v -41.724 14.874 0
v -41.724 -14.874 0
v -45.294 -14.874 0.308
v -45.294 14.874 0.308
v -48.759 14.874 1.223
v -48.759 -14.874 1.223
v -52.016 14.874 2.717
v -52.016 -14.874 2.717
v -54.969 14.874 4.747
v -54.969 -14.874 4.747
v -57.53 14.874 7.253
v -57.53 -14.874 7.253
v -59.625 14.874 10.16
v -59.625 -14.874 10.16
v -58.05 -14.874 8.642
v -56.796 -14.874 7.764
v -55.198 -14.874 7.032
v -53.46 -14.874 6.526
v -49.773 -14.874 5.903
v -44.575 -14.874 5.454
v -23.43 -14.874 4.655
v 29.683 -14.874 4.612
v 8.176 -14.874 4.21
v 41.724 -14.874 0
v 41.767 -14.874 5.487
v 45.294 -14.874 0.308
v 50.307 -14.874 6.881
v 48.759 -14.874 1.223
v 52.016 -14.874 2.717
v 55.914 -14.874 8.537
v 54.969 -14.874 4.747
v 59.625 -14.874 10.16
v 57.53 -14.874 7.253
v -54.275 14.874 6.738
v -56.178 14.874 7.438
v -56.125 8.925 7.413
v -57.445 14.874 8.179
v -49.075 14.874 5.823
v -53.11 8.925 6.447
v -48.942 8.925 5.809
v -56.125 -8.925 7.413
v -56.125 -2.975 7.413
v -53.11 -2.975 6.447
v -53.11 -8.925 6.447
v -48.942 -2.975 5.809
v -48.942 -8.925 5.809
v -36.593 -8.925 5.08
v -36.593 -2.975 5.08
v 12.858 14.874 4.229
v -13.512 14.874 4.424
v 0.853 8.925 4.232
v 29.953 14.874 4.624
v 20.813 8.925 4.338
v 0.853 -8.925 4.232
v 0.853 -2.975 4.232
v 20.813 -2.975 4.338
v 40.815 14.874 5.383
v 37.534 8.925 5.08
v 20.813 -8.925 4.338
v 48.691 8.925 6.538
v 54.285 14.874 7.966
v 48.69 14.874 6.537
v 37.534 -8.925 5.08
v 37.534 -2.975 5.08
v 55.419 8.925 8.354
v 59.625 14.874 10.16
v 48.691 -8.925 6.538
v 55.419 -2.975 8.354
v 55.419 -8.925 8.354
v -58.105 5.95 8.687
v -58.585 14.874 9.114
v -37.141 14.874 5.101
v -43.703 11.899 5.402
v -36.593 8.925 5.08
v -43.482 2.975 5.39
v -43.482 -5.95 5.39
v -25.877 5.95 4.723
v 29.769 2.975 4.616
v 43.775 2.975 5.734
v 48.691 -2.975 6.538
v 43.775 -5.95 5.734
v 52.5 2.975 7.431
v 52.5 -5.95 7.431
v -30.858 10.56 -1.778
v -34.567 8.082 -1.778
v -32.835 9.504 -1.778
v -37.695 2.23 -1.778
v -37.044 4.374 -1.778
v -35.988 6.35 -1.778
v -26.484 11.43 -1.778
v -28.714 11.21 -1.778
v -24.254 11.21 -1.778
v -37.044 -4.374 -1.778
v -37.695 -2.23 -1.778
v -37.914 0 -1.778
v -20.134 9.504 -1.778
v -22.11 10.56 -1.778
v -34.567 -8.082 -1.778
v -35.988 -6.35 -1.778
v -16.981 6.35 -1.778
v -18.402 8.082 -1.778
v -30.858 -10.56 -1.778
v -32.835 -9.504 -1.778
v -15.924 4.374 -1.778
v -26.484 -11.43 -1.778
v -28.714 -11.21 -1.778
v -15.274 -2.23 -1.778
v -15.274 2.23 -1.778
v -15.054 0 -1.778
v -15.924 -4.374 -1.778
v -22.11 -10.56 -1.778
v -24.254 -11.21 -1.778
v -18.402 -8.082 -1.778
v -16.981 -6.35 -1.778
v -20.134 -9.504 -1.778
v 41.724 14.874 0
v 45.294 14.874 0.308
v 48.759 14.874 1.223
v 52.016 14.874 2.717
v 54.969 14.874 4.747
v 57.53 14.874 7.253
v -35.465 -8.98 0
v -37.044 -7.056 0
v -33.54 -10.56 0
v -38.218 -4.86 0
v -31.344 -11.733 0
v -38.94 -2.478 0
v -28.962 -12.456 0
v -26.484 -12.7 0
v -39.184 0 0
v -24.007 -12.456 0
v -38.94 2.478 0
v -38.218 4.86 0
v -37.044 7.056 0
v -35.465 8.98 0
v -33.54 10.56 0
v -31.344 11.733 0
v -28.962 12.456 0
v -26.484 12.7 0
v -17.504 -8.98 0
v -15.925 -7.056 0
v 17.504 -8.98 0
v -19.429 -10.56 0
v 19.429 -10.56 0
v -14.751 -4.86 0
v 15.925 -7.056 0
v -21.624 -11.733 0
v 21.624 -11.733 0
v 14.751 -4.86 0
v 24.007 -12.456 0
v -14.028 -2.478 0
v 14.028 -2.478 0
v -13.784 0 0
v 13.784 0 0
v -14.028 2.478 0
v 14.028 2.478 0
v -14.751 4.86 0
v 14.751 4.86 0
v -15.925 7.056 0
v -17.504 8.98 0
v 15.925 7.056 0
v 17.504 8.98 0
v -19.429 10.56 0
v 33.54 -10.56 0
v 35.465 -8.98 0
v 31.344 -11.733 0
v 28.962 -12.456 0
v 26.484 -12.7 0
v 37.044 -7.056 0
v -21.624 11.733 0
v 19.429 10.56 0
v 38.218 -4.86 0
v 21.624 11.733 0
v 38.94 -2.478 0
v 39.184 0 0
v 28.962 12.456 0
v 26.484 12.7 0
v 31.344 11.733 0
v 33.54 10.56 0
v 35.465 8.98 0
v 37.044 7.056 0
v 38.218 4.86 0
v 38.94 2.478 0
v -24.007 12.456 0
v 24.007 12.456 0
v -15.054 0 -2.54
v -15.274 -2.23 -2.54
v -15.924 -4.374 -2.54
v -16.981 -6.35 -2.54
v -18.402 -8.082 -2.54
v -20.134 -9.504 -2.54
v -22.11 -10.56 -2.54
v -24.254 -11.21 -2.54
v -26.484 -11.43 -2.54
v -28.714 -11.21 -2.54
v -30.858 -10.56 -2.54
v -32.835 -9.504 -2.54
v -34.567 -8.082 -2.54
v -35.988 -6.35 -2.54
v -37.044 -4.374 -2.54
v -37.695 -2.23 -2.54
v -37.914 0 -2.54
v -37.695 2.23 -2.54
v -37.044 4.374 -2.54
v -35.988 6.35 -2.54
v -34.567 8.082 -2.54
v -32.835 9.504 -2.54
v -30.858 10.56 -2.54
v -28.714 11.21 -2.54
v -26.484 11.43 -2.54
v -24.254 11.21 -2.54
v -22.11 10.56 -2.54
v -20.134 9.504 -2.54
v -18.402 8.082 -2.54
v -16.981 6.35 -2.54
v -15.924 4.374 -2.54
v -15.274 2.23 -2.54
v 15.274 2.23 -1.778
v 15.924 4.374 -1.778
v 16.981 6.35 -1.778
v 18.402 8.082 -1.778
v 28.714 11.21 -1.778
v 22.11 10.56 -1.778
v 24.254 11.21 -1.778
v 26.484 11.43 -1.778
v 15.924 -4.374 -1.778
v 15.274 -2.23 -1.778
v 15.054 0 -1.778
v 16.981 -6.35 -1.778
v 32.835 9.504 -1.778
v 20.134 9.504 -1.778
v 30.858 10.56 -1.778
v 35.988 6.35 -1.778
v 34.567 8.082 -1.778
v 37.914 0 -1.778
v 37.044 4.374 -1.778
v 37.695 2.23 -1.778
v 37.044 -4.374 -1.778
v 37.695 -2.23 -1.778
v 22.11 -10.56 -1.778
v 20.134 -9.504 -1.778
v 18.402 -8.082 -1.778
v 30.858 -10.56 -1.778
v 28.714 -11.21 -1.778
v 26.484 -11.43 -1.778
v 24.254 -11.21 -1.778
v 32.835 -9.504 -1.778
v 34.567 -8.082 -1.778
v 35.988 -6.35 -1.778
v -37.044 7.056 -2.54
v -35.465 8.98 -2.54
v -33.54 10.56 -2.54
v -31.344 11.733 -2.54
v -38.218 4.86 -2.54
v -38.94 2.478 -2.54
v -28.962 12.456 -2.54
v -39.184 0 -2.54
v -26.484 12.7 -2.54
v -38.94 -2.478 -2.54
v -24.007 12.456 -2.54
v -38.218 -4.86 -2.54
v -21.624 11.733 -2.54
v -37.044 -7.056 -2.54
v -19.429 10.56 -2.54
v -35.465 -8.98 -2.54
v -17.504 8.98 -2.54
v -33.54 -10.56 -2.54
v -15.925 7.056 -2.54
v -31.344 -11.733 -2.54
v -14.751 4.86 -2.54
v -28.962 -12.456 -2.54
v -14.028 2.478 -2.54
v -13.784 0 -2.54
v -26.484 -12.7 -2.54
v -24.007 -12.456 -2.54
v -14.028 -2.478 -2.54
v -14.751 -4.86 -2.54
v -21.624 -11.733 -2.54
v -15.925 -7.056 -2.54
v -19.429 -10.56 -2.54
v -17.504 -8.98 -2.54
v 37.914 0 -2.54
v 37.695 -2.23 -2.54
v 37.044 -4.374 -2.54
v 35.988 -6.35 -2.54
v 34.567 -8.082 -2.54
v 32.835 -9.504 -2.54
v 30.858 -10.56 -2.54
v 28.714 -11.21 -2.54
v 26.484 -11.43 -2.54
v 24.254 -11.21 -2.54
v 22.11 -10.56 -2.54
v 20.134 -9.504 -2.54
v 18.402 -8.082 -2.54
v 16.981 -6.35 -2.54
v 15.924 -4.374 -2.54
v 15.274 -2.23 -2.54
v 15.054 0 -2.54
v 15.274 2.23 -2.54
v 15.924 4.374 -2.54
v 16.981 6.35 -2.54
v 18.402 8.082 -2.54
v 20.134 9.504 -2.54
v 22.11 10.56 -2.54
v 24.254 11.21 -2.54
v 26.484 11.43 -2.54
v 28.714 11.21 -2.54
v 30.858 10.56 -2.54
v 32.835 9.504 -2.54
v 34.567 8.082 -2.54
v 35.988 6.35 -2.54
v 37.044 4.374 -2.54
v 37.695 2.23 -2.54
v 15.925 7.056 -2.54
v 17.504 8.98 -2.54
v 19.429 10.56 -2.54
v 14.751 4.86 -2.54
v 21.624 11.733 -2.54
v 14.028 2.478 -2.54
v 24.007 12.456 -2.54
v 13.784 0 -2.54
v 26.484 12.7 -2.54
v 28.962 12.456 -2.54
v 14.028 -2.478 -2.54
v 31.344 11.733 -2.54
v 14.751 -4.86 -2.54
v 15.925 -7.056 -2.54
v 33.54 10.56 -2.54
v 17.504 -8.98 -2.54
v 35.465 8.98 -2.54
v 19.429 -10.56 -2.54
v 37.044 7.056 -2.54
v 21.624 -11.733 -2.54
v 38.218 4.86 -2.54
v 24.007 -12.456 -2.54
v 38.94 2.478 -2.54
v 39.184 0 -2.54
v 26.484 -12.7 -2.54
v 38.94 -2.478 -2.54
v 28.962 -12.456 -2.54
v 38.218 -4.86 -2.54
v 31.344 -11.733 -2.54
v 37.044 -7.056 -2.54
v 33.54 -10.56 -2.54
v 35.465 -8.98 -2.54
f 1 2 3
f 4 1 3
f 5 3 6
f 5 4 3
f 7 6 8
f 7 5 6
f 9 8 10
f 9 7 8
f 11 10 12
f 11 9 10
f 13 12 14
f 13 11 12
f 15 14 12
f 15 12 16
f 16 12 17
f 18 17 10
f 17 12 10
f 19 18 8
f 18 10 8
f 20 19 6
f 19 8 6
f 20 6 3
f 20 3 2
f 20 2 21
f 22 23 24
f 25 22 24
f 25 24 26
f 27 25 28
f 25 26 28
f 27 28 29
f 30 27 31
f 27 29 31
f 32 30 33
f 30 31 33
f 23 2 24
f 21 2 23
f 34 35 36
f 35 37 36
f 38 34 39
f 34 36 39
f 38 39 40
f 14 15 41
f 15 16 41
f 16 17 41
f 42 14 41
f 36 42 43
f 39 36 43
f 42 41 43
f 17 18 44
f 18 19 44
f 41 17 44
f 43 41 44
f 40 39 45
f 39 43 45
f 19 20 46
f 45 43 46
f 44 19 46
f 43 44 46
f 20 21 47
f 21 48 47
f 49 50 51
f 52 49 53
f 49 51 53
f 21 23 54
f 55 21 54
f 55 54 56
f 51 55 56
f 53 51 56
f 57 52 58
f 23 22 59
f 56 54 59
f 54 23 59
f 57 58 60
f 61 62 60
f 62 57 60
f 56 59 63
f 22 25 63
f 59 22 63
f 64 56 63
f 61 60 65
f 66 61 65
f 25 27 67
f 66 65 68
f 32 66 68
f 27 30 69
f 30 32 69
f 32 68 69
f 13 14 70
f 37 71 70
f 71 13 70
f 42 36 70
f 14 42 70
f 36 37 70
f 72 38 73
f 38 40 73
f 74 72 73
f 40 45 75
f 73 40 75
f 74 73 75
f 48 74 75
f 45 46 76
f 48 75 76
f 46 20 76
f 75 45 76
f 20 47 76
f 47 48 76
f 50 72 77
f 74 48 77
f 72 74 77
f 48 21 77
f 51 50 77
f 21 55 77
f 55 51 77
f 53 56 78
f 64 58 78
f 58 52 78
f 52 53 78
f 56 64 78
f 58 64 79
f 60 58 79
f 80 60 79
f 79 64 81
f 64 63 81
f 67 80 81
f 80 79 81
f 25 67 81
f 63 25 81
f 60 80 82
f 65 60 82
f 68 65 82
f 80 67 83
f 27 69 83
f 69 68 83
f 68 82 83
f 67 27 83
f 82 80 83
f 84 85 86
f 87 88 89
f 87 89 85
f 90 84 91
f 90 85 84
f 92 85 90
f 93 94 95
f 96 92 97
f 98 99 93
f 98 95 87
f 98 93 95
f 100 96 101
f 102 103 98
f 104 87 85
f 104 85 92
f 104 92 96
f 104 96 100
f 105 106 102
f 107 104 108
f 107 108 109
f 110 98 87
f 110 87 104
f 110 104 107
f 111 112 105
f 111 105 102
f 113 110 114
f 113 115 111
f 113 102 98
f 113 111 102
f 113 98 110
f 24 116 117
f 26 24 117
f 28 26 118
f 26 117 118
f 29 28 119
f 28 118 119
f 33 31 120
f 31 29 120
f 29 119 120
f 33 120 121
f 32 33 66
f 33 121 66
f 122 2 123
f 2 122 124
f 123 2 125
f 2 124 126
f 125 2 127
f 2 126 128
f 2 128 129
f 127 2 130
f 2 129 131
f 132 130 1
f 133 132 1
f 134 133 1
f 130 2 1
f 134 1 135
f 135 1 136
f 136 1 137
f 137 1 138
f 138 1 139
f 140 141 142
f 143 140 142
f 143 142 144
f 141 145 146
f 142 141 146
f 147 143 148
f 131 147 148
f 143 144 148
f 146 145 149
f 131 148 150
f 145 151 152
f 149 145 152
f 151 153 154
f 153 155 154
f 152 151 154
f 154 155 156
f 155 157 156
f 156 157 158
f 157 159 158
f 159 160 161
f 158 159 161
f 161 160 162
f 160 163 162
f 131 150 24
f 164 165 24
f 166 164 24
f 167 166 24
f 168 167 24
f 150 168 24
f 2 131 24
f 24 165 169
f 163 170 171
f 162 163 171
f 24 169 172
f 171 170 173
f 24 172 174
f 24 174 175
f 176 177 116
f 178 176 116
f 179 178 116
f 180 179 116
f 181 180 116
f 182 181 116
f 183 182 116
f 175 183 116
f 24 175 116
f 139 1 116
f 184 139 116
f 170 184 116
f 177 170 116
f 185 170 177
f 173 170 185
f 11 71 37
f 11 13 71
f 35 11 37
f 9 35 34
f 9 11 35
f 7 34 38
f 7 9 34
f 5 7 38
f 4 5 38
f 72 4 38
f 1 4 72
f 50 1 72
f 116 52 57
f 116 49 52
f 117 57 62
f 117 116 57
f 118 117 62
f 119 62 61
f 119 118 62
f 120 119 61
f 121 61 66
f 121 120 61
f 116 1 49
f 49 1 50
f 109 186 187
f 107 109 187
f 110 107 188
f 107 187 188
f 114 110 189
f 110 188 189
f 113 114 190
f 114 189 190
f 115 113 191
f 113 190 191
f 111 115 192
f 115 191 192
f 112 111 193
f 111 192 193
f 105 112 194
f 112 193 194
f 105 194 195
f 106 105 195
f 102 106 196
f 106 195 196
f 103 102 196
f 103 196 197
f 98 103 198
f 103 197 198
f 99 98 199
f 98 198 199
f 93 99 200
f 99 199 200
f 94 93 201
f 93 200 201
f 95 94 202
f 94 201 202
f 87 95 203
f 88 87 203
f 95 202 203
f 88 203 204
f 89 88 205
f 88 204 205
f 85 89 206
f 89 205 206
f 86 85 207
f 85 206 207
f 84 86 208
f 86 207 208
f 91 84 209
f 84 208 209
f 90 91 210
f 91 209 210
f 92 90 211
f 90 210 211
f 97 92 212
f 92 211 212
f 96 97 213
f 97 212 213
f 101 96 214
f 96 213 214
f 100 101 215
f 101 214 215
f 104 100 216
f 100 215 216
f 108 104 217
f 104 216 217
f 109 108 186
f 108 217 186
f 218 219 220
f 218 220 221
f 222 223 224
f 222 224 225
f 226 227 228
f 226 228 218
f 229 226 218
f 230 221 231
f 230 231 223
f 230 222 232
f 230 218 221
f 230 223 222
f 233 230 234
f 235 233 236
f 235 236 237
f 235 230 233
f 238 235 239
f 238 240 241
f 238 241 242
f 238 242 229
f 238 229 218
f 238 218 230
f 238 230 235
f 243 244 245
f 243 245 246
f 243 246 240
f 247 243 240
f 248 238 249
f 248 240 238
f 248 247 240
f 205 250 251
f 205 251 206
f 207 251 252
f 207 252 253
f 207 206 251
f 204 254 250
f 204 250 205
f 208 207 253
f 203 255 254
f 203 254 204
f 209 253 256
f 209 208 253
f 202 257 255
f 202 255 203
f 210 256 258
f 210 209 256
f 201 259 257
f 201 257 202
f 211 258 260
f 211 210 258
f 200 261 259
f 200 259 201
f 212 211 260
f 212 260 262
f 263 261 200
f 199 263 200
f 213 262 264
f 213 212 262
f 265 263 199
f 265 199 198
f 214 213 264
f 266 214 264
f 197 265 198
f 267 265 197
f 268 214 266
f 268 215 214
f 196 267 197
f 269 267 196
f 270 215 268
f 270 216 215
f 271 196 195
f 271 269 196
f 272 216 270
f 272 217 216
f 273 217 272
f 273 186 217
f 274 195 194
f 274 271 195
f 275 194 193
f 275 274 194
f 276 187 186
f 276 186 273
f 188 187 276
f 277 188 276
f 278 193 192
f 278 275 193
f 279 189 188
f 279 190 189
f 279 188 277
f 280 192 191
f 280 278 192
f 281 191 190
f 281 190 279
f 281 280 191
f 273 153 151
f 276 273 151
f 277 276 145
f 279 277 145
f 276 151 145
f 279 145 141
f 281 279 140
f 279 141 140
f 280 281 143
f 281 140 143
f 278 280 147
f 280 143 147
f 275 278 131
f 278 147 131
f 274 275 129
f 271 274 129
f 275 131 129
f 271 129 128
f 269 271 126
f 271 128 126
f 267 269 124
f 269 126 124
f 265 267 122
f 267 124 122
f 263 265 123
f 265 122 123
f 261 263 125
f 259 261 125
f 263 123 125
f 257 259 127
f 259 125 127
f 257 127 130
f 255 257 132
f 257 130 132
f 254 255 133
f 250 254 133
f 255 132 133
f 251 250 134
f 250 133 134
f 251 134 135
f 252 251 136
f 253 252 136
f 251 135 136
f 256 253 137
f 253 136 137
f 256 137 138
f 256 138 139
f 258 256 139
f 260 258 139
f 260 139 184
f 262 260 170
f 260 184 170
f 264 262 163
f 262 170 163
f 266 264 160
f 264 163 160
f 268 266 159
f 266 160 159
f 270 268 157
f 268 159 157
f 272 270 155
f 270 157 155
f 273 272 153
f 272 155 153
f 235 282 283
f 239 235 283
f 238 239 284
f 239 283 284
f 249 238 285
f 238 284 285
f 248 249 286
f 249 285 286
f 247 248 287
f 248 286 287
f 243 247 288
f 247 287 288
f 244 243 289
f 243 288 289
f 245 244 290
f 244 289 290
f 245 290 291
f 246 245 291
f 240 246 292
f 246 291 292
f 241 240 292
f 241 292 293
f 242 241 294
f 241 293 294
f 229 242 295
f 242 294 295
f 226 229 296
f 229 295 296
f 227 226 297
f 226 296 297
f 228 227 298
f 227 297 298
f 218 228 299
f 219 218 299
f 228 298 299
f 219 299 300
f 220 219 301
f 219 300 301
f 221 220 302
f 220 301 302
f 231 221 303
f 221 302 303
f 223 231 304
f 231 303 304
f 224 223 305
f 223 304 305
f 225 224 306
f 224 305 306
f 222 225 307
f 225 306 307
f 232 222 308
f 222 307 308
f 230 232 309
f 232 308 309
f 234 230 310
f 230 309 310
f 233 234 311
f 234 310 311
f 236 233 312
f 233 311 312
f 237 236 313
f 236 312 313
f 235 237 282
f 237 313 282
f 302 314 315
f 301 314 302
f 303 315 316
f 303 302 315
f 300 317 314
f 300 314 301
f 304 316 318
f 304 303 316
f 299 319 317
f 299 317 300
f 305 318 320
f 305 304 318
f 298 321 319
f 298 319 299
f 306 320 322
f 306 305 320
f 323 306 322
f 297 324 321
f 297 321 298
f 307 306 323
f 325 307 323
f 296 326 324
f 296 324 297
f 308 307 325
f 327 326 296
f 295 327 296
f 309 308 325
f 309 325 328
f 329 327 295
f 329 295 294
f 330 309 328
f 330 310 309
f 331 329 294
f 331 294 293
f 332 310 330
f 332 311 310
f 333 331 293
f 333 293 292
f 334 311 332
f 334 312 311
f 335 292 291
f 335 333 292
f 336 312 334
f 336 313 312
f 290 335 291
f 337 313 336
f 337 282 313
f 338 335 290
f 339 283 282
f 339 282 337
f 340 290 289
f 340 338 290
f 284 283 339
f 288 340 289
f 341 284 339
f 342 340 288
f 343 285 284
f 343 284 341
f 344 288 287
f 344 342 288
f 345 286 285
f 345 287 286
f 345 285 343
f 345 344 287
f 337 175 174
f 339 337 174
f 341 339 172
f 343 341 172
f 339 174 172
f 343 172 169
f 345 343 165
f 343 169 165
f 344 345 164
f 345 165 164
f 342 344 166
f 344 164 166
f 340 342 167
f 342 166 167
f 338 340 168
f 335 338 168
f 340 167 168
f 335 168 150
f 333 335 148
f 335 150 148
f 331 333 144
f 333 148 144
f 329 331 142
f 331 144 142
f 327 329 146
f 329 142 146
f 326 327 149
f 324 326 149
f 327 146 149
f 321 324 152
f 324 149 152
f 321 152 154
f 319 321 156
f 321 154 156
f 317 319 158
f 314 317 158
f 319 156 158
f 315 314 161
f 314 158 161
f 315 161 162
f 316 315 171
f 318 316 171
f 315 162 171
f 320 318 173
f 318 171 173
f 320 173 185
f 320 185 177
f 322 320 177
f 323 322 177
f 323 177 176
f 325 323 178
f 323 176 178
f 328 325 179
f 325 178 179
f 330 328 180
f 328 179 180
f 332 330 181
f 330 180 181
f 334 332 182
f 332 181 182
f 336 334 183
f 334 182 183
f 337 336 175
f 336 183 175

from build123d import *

# Parameters (mm, degrees)
F0_W        = 119.2497462034
F0_H        = 29.7487415373
F1_DEPTH    = 10.16
F3_DEPTH    = 35.052
F4_T1_DEPTH = 119.2514082514
F5_R        = 12.7
F6_DEPTH    = 2.54
F7_R        = 11.43
F8_DEPTH    = 0.762


# Not quite as in the source:
# - a fillet or chamfer that OpenCascade refuses, or shapes differently, is made with other operations: its cross-section is extruded or revolved along the edge and cut away or added


with BuildPart() as f1:
    # F0 (on Top) → F1 (new body)
    with BuildSketch(Plane.XY):
        Rectangle(F0_W, F0_H)
    extrude(amount=F1_DEPTH)

    # F2 (on face) → F3 (cut)
    with BuildSketch(Plane.XZ.offset(14.8743707687)):
        with BuildLine():
            Line((59.6248731017, 10.16), (-59.6248731017, 10.16))
            add(Edge.make_bspline(
                [(-59.6248731017, 10.16), (-58.6623700153, 9.1562491692), (-55.6761493356, 6.0420550119), (-35.1048833715, 4.7140763142), (36.3582789798, 3.1985096699), (54.6277439575, 7.7818062363), (58.3733948485, 9.5644064719), (59.6248731017, 10.16)],
                knots=[0, 0, 0, 0, 0.0978492049, 0.3035827346, 0.702960206, 0.9007545408, 1, 1, 1, 1], degree=3))
        make_face()
    extrude(amount=-F3_DEPTH, mode=Mode.SUBTRACT)

    # F4: fillet of radius 20.8491483247 on 2 edges, made by hand

    # F4_s2 → F4_t1 (cut)
    with BuildSketch(Plane.XZ.offset(-59.6257041257)):
        with BuildLine():
            ThreePointArc((41.7243397589, 0), (52.01577666, 2.7170411009), (59.6248731017, 10.16))
            Line((59.6248731017, 10.16), (59.6248731017, 0))
            Line((59.6248731017, 0), (41.7243397589, 0))
        make_face()
        with BuildLine():
            ThreePointArc((-41.7243397589, 0), (-52.01577666, 2.7170411009), (-59.6248731017, 10.16))
            Line((-59.6248731017, 10.16), (-59.6248731017, 0))
            Line((-59.6248731017, 0), (-41.7243397589, 0))
        make_face()
    extrude(amount=F4_T1_DEPTH, mode=Mode.SUBTRACT)

    # F5 (on face) → F6 (join)
    with BuildSketch(Plane(origin=(0, 0, 0), x_dir=(1, 0, 0), z_dir=(0, 0, -1))):
        with Locations((-26.4843397589, 0)):
            Circle(F5_R)
        with Locations((26.4843397589, 0)):
            Circle(F5_R)
    extrude(amount=F6_DEPTH)

    # F7 (on face) → F8 (cut)
    with BuildSketch(Plane(origin=(0, 0, -2.54), x_dir=(1, 0, 0), z_dir=(0, 0, -1))):
        with Locations((-26.4843397589, 0)):
            Circle(F7_R)
        with Locations((26.4843397589, 0)):
            Circle(F7_R)
    extrude(amount=-F8_DEPTH, mode=Mode.SUBTRACT)


solid = f1.part
